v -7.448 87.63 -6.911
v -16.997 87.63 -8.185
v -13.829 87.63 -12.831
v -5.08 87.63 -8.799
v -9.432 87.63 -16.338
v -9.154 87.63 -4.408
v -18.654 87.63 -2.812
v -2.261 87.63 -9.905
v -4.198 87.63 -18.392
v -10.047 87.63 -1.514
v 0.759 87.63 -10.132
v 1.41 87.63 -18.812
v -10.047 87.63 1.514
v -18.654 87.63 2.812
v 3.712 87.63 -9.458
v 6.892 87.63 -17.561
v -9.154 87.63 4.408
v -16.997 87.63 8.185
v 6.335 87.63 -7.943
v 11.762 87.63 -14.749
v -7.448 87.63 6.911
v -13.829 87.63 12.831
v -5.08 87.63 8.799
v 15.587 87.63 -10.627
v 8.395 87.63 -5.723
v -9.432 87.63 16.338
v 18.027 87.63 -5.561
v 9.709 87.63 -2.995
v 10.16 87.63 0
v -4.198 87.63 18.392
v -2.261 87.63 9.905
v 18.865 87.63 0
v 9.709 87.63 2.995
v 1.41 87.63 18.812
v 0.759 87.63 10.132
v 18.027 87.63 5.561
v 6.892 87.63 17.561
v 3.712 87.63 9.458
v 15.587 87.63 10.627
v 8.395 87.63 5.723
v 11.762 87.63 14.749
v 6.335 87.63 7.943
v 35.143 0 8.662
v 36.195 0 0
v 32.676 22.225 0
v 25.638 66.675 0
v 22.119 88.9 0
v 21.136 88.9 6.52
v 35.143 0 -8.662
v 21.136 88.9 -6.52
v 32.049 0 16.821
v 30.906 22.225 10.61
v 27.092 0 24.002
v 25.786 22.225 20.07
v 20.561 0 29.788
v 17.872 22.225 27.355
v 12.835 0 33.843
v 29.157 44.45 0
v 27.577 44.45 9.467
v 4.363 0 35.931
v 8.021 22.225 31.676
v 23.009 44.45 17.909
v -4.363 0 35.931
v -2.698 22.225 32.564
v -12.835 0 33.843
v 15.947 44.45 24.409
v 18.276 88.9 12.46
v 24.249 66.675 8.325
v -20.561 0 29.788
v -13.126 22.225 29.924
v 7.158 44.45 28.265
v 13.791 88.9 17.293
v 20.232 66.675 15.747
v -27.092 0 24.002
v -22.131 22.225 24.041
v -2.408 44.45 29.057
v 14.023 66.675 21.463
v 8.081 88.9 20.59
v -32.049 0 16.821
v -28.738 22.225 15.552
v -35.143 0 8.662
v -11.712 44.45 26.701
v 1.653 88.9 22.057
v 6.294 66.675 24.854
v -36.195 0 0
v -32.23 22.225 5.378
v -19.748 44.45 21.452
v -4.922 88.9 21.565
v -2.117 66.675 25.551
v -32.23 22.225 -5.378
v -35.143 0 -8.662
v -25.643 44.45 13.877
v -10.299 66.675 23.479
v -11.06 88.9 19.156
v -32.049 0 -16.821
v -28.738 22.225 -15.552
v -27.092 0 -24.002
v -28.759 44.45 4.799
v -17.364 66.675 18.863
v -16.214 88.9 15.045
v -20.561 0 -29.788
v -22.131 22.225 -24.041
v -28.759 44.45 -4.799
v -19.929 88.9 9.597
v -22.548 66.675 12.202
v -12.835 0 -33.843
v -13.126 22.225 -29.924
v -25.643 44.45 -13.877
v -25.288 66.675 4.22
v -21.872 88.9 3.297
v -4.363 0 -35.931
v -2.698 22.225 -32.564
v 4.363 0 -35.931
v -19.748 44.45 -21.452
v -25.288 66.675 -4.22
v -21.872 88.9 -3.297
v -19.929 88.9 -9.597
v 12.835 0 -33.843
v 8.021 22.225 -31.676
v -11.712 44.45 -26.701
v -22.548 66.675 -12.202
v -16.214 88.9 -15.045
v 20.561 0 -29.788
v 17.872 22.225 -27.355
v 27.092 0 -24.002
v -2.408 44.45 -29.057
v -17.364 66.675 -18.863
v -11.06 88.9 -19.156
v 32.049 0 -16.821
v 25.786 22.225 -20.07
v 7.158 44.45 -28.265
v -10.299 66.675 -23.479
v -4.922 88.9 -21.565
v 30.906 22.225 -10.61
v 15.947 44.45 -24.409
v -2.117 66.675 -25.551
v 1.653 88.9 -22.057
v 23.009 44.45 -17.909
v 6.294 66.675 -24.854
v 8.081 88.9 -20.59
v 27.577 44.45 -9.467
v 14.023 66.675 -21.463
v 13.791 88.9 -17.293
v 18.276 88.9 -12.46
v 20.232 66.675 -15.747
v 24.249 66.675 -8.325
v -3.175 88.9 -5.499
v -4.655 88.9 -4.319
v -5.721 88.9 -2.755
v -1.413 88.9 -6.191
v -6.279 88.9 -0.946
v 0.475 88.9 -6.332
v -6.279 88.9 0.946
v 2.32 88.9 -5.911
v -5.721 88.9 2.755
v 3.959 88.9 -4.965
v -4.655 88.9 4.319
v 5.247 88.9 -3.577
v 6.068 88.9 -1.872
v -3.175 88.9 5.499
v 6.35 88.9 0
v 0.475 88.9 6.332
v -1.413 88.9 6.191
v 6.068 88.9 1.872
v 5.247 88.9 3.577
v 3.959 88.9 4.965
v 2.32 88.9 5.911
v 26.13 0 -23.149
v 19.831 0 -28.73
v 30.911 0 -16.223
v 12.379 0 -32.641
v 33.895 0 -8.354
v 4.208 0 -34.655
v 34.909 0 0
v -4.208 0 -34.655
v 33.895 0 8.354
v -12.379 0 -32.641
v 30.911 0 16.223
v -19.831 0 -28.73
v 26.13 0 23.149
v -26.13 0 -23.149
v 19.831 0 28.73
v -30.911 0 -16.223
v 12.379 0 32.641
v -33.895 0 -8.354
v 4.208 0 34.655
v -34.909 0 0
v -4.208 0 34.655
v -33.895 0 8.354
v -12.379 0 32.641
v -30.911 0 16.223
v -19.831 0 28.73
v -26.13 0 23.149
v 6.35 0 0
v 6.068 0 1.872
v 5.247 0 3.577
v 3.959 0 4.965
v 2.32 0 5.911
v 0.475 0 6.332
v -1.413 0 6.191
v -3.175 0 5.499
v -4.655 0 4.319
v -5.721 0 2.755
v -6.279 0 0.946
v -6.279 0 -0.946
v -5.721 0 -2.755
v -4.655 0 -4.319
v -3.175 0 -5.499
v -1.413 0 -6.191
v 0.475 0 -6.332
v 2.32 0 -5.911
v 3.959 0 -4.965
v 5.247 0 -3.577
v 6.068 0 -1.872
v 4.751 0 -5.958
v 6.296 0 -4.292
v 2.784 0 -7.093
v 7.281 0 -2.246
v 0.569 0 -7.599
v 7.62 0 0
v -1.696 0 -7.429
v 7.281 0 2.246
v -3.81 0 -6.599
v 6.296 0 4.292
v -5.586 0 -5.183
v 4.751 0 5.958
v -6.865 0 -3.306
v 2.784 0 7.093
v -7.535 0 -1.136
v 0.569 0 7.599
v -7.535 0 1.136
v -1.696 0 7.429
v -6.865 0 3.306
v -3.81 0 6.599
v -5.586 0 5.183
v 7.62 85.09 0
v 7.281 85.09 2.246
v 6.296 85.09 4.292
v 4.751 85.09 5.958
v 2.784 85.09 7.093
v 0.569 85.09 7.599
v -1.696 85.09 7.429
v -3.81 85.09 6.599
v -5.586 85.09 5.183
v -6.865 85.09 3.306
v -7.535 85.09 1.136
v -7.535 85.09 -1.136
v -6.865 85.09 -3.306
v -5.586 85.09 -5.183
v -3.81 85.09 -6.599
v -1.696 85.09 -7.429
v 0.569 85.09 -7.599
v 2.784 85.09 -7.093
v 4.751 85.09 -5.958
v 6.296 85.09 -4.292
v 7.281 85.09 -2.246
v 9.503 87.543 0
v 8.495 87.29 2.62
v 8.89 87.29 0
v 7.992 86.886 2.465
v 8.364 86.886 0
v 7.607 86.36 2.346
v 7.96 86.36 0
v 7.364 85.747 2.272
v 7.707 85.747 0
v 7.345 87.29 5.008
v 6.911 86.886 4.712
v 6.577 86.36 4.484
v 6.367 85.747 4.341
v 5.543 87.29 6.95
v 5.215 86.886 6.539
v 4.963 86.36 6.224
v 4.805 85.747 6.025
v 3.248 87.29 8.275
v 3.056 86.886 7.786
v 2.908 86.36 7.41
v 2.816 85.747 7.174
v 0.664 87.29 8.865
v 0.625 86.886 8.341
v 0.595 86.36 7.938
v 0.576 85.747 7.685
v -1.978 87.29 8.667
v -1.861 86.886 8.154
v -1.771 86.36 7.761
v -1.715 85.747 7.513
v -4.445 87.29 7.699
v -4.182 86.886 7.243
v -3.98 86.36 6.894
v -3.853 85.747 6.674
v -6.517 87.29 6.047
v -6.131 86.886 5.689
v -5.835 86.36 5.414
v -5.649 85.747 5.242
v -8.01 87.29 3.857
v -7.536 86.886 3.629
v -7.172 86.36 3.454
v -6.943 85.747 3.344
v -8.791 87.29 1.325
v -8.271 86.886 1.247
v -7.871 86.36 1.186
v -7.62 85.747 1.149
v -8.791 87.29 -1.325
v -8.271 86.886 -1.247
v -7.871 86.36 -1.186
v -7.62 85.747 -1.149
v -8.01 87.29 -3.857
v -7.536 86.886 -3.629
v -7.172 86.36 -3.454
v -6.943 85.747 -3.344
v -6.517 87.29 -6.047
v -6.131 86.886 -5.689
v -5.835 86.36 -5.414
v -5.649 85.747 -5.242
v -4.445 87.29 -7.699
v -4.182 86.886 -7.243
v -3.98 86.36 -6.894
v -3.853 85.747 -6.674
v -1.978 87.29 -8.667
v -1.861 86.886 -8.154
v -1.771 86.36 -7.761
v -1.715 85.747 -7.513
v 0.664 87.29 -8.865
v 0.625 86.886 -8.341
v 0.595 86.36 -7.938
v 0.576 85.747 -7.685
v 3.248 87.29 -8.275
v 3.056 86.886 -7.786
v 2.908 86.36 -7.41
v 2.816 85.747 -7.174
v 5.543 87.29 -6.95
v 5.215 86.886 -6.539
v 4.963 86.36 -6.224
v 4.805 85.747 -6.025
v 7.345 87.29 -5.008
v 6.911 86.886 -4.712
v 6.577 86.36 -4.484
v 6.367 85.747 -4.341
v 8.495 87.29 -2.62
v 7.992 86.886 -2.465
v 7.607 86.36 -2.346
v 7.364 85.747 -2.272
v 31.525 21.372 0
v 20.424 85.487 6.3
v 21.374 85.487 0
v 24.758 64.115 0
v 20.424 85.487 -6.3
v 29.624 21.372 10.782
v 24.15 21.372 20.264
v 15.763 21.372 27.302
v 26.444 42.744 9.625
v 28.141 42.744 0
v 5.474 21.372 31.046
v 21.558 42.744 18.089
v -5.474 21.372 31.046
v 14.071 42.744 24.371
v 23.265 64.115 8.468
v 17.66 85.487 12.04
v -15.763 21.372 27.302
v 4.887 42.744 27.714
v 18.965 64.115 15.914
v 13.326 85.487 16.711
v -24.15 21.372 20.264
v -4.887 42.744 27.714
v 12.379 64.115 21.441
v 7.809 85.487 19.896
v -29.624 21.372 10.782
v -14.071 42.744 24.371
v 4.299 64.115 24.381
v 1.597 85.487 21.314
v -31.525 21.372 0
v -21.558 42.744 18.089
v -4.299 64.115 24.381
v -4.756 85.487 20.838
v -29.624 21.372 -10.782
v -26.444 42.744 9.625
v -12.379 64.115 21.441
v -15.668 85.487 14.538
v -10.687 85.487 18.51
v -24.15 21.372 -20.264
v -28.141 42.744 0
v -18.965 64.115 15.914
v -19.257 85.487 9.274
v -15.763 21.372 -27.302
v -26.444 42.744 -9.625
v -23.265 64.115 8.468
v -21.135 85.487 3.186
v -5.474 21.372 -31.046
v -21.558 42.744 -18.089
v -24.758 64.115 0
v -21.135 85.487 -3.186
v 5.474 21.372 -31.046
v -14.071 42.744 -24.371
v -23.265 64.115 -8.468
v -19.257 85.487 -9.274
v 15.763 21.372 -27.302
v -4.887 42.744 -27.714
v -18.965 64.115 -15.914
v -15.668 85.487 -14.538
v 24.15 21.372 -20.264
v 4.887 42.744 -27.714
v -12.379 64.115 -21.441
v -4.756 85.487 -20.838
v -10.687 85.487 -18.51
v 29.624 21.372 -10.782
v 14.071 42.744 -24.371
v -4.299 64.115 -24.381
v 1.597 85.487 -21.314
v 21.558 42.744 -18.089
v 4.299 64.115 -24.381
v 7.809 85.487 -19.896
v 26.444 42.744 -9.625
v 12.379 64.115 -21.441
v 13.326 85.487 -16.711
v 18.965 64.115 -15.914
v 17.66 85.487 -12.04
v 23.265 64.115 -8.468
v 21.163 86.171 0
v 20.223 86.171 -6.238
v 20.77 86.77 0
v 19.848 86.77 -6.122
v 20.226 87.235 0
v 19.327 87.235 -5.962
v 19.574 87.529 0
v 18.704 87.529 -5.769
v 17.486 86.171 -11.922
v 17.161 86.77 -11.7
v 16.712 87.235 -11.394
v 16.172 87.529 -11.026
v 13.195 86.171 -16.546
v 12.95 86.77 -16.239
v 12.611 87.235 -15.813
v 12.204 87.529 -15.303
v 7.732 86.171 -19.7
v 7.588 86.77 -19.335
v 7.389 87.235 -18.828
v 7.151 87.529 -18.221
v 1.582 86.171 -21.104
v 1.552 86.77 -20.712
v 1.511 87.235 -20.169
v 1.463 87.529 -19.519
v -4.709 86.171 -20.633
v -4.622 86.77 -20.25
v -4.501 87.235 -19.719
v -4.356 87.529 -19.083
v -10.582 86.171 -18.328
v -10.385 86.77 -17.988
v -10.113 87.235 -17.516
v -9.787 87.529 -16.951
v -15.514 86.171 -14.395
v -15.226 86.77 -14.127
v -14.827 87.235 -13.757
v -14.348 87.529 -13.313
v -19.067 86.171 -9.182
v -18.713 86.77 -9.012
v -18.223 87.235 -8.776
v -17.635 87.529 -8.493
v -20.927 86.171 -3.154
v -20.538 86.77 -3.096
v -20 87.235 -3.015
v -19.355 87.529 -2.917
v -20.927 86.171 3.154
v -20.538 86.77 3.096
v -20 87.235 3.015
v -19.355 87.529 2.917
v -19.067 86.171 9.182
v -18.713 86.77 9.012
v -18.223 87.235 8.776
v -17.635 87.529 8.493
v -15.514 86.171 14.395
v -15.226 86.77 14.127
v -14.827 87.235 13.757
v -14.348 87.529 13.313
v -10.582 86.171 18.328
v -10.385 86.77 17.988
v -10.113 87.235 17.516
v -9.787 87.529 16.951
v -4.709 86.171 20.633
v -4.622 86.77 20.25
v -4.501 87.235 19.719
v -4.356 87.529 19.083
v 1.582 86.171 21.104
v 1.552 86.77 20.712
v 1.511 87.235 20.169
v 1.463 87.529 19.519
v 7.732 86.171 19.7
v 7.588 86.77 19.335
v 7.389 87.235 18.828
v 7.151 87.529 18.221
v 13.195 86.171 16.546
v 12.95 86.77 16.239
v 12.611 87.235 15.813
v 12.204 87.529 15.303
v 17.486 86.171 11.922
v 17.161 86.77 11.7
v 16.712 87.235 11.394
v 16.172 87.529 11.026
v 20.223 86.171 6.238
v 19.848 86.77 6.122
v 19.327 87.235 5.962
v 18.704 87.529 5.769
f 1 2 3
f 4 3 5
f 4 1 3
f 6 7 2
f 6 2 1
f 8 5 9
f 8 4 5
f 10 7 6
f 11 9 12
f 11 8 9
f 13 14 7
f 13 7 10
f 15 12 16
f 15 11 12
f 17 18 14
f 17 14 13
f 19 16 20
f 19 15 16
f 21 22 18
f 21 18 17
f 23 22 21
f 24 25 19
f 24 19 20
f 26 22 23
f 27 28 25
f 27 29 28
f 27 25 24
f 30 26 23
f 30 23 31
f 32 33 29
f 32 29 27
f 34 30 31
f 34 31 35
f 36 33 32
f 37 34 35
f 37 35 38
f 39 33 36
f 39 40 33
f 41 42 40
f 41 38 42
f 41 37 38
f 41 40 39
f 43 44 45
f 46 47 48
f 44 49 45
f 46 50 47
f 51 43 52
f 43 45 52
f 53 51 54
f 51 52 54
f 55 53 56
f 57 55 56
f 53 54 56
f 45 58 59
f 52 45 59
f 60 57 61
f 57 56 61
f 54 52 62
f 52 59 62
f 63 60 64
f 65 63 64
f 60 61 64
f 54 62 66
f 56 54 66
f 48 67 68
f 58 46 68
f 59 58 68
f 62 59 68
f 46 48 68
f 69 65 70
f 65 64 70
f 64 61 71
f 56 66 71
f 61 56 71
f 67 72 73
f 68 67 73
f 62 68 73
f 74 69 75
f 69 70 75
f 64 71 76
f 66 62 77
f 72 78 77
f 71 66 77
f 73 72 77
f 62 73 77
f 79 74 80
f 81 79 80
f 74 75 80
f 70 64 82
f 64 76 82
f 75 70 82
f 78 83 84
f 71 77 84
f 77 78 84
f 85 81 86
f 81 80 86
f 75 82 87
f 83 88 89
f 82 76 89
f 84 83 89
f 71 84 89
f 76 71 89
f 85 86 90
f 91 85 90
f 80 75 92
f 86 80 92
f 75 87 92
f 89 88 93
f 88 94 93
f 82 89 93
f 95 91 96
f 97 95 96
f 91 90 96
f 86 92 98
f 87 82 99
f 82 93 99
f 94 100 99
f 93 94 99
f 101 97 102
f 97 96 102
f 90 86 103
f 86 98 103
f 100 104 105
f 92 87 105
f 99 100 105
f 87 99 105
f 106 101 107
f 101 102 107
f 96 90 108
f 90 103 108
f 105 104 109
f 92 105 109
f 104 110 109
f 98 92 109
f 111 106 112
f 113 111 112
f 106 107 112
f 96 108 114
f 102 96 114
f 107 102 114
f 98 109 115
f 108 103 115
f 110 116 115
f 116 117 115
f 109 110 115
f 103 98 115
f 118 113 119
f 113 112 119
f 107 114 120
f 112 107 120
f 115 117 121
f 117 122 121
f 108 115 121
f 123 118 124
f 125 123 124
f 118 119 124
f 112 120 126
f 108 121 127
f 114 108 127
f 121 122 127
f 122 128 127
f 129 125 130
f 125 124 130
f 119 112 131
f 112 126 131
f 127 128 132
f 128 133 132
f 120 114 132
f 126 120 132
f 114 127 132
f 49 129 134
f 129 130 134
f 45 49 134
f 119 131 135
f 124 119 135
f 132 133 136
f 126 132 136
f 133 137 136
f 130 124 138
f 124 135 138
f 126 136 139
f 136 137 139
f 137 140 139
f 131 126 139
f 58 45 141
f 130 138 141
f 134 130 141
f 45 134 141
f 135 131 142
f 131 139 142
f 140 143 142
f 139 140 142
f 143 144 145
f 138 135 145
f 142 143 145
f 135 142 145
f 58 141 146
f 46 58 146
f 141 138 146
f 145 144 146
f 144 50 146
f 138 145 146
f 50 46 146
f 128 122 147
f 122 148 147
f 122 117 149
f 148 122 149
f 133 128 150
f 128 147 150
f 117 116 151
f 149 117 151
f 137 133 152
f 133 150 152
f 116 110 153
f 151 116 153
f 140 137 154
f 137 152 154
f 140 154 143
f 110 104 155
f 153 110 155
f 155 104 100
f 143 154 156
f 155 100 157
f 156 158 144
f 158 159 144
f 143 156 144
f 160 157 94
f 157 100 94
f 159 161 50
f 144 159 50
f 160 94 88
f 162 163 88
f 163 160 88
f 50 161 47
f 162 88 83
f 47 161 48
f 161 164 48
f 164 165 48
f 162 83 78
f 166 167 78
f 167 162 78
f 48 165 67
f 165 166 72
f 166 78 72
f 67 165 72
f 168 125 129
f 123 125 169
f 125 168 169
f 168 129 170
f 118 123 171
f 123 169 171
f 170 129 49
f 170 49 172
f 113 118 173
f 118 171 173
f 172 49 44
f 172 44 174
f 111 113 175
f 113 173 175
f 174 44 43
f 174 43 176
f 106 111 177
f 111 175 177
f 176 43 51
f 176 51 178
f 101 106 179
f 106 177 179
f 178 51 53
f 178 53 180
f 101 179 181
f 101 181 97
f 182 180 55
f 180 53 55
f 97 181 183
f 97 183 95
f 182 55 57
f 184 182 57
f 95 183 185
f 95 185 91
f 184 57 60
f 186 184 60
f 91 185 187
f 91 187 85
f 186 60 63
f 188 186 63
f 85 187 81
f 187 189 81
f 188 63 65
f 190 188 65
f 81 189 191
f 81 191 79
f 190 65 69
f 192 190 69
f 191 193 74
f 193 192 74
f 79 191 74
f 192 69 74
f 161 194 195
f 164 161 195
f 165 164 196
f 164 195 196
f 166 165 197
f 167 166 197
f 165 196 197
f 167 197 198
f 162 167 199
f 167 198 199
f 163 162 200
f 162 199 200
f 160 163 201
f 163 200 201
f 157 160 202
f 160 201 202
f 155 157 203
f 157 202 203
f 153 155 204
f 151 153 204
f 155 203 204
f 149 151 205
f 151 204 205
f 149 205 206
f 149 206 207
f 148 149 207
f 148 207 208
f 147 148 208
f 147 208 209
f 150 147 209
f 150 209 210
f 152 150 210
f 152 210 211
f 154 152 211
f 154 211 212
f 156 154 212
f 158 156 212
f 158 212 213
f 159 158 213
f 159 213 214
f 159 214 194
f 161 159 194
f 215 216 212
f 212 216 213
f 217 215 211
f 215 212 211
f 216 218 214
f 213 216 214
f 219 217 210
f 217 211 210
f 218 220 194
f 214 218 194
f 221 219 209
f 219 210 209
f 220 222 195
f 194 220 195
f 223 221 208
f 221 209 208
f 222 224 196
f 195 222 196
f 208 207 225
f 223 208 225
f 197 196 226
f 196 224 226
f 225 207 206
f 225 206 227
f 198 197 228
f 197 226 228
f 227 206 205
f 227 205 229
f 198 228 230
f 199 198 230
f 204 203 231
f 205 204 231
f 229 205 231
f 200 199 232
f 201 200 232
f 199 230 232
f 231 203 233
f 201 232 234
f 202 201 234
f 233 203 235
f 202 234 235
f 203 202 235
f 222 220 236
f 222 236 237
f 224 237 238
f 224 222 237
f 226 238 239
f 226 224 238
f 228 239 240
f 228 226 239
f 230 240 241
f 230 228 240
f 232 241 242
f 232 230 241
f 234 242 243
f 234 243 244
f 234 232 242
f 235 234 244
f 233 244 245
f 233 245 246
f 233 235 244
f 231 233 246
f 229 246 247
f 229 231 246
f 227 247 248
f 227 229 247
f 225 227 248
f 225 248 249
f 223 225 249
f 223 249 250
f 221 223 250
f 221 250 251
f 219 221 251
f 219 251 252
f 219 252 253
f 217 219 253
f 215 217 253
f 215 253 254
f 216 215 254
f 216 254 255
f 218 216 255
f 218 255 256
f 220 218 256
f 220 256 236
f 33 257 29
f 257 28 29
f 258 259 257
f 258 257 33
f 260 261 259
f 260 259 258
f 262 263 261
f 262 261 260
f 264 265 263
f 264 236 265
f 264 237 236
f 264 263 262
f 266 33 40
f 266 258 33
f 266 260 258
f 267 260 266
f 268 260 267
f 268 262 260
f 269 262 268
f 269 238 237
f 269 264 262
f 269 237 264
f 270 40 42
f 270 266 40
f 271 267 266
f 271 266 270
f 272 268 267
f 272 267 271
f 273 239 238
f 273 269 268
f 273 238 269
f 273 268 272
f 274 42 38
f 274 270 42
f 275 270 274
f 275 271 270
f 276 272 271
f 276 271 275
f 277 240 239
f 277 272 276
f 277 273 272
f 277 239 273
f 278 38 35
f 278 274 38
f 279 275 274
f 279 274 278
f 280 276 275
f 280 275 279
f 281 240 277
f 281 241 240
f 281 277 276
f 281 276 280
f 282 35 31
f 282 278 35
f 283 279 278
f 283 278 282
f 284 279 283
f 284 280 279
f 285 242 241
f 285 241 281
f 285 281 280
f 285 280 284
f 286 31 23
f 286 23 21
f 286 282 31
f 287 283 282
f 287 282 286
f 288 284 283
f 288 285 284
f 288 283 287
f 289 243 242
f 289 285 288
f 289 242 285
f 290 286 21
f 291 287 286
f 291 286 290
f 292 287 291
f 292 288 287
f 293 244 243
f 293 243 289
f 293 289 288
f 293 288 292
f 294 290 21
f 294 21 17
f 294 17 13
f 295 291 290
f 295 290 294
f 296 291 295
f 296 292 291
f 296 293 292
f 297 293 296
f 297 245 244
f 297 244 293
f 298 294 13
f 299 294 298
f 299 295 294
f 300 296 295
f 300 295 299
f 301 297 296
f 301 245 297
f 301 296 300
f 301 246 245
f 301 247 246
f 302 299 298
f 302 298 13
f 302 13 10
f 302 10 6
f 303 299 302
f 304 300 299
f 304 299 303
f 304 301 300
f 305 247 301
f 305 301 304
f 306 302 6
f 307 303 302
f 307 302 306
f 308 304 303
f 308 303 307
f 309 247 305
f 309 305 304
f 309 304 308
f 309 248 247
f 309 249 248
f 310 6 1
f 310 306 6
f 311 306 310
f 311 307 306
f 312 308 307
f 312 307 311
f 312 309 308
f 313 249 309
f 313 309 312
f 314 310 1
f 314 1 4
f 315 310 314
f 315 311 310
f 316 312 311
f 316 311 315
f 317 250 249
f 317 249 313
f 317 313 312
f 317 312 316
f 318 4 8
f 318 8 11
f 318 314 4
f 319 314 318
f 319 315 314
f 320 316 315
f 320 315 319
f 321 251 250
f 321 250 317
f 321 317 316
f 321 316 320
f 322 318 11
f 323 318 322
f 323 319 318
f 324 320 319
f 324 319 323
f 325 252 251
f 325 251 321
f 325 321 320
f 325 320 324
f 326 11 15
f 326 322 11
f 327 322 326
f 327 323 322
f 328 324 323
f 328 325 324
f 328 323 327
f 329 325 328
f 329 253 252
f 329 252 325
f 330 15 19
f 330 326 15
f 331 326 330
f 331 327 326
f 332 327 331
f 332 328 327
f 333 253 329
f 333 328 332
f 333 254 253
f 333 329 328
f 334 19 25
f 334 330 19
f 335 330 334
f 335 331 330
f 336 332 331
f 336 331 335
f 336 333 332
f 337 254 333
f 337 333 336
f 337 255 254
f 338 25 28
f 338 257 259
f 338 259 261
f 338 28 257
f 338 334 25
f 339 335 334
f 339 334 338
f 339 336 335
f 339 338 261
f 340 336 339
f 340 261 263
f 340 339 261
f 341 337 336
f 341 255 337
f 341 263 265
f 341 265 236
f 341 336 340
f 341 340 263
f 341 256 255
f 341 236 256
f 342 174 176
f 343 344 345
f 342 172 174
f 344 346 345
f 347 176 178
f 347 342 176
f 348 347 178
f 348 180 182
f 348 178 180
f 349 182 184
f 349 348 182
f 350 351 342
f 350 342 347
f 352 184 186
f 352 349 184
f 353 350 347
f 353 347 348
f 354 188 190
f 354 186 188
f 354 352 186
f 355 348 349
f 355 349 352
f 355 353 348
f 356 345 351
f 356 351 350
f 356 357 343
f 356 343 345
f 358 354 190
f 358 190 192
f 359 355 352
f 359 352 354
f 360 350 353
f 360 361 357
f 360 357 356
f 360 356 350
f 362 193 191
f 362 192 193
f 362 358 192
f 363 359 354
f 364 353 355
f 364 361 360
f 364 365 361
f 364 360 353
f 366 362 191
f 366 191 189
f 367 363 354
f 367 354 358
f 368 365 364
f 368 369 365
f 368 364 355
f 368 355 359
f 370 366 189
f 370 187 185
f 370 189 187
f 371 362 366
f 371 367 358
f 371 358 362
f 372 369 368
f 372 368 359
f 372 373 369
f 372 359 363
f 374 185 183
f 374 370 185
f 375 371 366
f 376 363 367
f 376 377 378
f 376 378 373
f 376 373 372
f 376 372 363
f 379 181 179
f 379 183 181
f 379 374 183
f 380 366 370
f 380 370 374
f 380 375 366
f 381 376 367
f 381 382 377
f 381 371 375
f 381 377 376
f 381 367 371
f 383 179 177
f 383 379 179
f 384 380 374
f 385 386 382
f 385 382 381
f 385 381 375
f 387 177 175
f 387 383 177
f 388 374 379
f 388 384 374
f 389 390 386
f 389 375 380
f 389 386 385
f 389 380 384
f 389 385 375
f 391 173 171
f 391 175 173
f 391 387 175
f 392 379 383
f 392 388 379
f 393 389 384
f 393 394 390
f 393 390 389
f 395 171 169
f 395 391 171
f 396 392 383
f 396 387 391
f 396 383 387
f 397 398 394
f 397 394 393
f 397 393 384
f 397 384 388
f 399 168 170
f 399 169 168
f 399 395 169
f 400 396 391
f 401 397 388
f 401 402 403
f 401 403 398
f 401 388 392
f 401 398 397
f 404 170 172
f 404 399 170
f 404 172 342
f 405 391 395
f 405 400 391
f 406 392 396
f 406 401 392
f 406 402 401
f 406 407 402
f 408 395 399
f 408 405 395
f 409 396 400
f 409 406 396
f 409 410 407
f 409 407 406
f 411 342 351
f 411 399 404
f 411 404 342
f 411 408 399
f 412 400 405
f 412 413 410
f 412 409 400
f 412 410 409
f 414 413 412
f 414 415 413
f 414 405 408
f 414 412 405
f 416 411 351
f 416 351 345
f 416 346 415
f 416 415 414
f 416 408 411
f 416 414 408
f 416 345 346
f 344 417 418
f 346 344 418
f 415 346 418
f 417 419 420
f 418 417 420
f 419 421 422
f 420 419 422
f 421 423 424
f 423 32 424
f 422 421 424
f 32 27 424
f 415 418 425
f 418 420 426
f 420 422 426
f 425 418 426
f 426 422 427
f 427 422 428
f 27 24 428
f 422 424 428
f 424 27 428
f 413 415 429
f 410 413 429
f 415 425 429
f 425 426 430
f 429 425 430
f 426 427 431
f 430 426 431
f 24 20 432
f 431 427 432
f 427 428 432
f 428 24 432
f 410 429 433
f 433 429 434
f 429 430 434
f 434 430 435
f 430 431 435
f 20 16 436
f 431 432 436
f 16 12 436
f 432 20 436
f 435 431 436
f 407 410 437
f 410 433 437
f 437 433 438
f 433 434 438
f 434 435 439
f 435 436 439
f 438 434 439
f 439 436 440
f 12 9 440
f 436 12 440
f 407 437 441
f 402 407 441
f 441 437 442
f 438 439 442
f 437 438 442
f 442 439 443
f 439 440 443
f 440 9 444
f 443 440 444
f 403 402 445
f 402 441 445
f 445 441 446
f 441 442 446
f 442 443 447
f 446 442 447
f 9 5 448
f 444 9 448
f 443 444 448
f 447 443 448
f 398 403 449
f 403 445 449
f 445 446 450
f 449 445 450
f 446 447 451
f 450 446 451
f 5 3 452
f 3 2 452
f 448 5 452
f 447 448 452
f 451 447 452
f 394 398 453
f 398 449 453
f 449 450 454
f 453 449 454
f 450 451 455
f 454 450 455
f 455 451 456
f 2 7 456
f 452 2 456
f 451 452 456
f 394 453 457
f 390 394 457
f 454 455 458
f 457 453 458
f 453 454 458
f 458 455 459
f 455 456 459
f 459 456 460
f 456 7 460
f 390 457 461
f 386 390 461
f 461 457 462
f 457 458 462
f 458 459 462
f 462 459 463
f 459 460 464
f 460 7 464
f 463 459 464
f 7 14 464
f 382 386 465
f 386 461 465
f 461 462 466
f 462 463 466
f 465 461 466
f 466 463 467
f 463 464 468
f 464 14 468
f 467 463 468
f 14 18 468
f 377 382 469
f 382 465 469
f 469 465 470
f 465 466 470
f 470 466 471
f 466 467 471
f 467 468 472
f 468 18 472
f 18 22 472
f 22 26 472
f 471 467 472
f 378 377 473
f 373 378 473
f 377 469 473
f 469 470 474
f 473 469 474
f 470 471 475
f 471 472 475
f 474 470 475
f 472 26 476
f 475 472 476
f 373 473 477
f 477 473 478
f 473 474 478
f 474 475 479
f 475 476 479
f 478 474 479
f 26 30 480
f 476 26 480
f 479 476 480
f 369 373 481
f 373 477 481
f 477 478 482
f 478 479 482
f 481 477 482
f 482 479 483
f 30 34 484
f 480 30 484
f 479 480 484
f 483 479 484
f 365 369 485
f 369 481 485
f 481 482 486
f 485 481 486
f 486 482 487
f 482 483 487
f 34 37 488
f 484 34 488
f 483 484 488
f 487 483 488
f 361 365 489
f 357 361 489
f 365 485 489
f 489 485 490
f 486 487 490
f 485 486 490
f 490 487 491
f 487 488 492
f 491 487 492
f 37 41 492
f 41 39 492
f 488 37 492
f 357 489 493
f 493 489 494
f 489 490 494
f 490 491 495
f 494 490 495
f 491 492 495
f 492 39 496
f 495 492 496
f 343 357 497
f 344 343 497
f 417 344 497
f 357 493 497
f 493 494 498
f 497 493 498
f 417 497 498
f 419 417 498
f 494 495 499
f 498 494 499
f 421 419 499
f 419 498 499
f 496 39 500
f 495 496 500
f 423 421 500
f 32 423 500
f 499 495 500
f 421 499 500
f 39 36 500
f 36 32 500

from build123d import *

# Parameters (mm, degrees)
SKETCH3_R          = 6.35
CUT_EXTRUDE1_DEPTH = 89.9
SHELL1_T           = -1.27
FILLET1_R          = 2.54


with BuildPart() as part:
    # Sketch2 → Revolve1 (revolve)
    with BuildSketch(Plane.XY):
        Polygon((0, 0), (36.195, 0), (22.119166667, 88.9), (0, 88.9), align=None)
    revolve(axis=Axis((0, 88.9, 0), (0, -1, 0)))

    # Sketch3 → Cut-Extrude1 (cut, through all)
    with BuildSketch(Plane.XZ):
        Circle(SKETCH3_R)
    extrude(amount=-CUT_EXTRUDE1_DEPTH, mode=Mode.SUBTRACT)

    # Shell1
    shell1_openings = [part.faces().sort_by_distance(p)[0] for p in [
        (6.35, 0, 0),
    ]]
    offset(amount=SHELL1_T, openings=shell1_openings, kind=Kind.INTERSECTION)

    # Fillet1
    fillet1_edges = [part.edges().sort_by_distance(p)[0] for p in [
        (-7.62, 87.63, 0),
        (-21.034429442, 87.63, 0),
    ]]
    fillet(fillet1_edges, radius=FILLET1_R)


solid = part.part
